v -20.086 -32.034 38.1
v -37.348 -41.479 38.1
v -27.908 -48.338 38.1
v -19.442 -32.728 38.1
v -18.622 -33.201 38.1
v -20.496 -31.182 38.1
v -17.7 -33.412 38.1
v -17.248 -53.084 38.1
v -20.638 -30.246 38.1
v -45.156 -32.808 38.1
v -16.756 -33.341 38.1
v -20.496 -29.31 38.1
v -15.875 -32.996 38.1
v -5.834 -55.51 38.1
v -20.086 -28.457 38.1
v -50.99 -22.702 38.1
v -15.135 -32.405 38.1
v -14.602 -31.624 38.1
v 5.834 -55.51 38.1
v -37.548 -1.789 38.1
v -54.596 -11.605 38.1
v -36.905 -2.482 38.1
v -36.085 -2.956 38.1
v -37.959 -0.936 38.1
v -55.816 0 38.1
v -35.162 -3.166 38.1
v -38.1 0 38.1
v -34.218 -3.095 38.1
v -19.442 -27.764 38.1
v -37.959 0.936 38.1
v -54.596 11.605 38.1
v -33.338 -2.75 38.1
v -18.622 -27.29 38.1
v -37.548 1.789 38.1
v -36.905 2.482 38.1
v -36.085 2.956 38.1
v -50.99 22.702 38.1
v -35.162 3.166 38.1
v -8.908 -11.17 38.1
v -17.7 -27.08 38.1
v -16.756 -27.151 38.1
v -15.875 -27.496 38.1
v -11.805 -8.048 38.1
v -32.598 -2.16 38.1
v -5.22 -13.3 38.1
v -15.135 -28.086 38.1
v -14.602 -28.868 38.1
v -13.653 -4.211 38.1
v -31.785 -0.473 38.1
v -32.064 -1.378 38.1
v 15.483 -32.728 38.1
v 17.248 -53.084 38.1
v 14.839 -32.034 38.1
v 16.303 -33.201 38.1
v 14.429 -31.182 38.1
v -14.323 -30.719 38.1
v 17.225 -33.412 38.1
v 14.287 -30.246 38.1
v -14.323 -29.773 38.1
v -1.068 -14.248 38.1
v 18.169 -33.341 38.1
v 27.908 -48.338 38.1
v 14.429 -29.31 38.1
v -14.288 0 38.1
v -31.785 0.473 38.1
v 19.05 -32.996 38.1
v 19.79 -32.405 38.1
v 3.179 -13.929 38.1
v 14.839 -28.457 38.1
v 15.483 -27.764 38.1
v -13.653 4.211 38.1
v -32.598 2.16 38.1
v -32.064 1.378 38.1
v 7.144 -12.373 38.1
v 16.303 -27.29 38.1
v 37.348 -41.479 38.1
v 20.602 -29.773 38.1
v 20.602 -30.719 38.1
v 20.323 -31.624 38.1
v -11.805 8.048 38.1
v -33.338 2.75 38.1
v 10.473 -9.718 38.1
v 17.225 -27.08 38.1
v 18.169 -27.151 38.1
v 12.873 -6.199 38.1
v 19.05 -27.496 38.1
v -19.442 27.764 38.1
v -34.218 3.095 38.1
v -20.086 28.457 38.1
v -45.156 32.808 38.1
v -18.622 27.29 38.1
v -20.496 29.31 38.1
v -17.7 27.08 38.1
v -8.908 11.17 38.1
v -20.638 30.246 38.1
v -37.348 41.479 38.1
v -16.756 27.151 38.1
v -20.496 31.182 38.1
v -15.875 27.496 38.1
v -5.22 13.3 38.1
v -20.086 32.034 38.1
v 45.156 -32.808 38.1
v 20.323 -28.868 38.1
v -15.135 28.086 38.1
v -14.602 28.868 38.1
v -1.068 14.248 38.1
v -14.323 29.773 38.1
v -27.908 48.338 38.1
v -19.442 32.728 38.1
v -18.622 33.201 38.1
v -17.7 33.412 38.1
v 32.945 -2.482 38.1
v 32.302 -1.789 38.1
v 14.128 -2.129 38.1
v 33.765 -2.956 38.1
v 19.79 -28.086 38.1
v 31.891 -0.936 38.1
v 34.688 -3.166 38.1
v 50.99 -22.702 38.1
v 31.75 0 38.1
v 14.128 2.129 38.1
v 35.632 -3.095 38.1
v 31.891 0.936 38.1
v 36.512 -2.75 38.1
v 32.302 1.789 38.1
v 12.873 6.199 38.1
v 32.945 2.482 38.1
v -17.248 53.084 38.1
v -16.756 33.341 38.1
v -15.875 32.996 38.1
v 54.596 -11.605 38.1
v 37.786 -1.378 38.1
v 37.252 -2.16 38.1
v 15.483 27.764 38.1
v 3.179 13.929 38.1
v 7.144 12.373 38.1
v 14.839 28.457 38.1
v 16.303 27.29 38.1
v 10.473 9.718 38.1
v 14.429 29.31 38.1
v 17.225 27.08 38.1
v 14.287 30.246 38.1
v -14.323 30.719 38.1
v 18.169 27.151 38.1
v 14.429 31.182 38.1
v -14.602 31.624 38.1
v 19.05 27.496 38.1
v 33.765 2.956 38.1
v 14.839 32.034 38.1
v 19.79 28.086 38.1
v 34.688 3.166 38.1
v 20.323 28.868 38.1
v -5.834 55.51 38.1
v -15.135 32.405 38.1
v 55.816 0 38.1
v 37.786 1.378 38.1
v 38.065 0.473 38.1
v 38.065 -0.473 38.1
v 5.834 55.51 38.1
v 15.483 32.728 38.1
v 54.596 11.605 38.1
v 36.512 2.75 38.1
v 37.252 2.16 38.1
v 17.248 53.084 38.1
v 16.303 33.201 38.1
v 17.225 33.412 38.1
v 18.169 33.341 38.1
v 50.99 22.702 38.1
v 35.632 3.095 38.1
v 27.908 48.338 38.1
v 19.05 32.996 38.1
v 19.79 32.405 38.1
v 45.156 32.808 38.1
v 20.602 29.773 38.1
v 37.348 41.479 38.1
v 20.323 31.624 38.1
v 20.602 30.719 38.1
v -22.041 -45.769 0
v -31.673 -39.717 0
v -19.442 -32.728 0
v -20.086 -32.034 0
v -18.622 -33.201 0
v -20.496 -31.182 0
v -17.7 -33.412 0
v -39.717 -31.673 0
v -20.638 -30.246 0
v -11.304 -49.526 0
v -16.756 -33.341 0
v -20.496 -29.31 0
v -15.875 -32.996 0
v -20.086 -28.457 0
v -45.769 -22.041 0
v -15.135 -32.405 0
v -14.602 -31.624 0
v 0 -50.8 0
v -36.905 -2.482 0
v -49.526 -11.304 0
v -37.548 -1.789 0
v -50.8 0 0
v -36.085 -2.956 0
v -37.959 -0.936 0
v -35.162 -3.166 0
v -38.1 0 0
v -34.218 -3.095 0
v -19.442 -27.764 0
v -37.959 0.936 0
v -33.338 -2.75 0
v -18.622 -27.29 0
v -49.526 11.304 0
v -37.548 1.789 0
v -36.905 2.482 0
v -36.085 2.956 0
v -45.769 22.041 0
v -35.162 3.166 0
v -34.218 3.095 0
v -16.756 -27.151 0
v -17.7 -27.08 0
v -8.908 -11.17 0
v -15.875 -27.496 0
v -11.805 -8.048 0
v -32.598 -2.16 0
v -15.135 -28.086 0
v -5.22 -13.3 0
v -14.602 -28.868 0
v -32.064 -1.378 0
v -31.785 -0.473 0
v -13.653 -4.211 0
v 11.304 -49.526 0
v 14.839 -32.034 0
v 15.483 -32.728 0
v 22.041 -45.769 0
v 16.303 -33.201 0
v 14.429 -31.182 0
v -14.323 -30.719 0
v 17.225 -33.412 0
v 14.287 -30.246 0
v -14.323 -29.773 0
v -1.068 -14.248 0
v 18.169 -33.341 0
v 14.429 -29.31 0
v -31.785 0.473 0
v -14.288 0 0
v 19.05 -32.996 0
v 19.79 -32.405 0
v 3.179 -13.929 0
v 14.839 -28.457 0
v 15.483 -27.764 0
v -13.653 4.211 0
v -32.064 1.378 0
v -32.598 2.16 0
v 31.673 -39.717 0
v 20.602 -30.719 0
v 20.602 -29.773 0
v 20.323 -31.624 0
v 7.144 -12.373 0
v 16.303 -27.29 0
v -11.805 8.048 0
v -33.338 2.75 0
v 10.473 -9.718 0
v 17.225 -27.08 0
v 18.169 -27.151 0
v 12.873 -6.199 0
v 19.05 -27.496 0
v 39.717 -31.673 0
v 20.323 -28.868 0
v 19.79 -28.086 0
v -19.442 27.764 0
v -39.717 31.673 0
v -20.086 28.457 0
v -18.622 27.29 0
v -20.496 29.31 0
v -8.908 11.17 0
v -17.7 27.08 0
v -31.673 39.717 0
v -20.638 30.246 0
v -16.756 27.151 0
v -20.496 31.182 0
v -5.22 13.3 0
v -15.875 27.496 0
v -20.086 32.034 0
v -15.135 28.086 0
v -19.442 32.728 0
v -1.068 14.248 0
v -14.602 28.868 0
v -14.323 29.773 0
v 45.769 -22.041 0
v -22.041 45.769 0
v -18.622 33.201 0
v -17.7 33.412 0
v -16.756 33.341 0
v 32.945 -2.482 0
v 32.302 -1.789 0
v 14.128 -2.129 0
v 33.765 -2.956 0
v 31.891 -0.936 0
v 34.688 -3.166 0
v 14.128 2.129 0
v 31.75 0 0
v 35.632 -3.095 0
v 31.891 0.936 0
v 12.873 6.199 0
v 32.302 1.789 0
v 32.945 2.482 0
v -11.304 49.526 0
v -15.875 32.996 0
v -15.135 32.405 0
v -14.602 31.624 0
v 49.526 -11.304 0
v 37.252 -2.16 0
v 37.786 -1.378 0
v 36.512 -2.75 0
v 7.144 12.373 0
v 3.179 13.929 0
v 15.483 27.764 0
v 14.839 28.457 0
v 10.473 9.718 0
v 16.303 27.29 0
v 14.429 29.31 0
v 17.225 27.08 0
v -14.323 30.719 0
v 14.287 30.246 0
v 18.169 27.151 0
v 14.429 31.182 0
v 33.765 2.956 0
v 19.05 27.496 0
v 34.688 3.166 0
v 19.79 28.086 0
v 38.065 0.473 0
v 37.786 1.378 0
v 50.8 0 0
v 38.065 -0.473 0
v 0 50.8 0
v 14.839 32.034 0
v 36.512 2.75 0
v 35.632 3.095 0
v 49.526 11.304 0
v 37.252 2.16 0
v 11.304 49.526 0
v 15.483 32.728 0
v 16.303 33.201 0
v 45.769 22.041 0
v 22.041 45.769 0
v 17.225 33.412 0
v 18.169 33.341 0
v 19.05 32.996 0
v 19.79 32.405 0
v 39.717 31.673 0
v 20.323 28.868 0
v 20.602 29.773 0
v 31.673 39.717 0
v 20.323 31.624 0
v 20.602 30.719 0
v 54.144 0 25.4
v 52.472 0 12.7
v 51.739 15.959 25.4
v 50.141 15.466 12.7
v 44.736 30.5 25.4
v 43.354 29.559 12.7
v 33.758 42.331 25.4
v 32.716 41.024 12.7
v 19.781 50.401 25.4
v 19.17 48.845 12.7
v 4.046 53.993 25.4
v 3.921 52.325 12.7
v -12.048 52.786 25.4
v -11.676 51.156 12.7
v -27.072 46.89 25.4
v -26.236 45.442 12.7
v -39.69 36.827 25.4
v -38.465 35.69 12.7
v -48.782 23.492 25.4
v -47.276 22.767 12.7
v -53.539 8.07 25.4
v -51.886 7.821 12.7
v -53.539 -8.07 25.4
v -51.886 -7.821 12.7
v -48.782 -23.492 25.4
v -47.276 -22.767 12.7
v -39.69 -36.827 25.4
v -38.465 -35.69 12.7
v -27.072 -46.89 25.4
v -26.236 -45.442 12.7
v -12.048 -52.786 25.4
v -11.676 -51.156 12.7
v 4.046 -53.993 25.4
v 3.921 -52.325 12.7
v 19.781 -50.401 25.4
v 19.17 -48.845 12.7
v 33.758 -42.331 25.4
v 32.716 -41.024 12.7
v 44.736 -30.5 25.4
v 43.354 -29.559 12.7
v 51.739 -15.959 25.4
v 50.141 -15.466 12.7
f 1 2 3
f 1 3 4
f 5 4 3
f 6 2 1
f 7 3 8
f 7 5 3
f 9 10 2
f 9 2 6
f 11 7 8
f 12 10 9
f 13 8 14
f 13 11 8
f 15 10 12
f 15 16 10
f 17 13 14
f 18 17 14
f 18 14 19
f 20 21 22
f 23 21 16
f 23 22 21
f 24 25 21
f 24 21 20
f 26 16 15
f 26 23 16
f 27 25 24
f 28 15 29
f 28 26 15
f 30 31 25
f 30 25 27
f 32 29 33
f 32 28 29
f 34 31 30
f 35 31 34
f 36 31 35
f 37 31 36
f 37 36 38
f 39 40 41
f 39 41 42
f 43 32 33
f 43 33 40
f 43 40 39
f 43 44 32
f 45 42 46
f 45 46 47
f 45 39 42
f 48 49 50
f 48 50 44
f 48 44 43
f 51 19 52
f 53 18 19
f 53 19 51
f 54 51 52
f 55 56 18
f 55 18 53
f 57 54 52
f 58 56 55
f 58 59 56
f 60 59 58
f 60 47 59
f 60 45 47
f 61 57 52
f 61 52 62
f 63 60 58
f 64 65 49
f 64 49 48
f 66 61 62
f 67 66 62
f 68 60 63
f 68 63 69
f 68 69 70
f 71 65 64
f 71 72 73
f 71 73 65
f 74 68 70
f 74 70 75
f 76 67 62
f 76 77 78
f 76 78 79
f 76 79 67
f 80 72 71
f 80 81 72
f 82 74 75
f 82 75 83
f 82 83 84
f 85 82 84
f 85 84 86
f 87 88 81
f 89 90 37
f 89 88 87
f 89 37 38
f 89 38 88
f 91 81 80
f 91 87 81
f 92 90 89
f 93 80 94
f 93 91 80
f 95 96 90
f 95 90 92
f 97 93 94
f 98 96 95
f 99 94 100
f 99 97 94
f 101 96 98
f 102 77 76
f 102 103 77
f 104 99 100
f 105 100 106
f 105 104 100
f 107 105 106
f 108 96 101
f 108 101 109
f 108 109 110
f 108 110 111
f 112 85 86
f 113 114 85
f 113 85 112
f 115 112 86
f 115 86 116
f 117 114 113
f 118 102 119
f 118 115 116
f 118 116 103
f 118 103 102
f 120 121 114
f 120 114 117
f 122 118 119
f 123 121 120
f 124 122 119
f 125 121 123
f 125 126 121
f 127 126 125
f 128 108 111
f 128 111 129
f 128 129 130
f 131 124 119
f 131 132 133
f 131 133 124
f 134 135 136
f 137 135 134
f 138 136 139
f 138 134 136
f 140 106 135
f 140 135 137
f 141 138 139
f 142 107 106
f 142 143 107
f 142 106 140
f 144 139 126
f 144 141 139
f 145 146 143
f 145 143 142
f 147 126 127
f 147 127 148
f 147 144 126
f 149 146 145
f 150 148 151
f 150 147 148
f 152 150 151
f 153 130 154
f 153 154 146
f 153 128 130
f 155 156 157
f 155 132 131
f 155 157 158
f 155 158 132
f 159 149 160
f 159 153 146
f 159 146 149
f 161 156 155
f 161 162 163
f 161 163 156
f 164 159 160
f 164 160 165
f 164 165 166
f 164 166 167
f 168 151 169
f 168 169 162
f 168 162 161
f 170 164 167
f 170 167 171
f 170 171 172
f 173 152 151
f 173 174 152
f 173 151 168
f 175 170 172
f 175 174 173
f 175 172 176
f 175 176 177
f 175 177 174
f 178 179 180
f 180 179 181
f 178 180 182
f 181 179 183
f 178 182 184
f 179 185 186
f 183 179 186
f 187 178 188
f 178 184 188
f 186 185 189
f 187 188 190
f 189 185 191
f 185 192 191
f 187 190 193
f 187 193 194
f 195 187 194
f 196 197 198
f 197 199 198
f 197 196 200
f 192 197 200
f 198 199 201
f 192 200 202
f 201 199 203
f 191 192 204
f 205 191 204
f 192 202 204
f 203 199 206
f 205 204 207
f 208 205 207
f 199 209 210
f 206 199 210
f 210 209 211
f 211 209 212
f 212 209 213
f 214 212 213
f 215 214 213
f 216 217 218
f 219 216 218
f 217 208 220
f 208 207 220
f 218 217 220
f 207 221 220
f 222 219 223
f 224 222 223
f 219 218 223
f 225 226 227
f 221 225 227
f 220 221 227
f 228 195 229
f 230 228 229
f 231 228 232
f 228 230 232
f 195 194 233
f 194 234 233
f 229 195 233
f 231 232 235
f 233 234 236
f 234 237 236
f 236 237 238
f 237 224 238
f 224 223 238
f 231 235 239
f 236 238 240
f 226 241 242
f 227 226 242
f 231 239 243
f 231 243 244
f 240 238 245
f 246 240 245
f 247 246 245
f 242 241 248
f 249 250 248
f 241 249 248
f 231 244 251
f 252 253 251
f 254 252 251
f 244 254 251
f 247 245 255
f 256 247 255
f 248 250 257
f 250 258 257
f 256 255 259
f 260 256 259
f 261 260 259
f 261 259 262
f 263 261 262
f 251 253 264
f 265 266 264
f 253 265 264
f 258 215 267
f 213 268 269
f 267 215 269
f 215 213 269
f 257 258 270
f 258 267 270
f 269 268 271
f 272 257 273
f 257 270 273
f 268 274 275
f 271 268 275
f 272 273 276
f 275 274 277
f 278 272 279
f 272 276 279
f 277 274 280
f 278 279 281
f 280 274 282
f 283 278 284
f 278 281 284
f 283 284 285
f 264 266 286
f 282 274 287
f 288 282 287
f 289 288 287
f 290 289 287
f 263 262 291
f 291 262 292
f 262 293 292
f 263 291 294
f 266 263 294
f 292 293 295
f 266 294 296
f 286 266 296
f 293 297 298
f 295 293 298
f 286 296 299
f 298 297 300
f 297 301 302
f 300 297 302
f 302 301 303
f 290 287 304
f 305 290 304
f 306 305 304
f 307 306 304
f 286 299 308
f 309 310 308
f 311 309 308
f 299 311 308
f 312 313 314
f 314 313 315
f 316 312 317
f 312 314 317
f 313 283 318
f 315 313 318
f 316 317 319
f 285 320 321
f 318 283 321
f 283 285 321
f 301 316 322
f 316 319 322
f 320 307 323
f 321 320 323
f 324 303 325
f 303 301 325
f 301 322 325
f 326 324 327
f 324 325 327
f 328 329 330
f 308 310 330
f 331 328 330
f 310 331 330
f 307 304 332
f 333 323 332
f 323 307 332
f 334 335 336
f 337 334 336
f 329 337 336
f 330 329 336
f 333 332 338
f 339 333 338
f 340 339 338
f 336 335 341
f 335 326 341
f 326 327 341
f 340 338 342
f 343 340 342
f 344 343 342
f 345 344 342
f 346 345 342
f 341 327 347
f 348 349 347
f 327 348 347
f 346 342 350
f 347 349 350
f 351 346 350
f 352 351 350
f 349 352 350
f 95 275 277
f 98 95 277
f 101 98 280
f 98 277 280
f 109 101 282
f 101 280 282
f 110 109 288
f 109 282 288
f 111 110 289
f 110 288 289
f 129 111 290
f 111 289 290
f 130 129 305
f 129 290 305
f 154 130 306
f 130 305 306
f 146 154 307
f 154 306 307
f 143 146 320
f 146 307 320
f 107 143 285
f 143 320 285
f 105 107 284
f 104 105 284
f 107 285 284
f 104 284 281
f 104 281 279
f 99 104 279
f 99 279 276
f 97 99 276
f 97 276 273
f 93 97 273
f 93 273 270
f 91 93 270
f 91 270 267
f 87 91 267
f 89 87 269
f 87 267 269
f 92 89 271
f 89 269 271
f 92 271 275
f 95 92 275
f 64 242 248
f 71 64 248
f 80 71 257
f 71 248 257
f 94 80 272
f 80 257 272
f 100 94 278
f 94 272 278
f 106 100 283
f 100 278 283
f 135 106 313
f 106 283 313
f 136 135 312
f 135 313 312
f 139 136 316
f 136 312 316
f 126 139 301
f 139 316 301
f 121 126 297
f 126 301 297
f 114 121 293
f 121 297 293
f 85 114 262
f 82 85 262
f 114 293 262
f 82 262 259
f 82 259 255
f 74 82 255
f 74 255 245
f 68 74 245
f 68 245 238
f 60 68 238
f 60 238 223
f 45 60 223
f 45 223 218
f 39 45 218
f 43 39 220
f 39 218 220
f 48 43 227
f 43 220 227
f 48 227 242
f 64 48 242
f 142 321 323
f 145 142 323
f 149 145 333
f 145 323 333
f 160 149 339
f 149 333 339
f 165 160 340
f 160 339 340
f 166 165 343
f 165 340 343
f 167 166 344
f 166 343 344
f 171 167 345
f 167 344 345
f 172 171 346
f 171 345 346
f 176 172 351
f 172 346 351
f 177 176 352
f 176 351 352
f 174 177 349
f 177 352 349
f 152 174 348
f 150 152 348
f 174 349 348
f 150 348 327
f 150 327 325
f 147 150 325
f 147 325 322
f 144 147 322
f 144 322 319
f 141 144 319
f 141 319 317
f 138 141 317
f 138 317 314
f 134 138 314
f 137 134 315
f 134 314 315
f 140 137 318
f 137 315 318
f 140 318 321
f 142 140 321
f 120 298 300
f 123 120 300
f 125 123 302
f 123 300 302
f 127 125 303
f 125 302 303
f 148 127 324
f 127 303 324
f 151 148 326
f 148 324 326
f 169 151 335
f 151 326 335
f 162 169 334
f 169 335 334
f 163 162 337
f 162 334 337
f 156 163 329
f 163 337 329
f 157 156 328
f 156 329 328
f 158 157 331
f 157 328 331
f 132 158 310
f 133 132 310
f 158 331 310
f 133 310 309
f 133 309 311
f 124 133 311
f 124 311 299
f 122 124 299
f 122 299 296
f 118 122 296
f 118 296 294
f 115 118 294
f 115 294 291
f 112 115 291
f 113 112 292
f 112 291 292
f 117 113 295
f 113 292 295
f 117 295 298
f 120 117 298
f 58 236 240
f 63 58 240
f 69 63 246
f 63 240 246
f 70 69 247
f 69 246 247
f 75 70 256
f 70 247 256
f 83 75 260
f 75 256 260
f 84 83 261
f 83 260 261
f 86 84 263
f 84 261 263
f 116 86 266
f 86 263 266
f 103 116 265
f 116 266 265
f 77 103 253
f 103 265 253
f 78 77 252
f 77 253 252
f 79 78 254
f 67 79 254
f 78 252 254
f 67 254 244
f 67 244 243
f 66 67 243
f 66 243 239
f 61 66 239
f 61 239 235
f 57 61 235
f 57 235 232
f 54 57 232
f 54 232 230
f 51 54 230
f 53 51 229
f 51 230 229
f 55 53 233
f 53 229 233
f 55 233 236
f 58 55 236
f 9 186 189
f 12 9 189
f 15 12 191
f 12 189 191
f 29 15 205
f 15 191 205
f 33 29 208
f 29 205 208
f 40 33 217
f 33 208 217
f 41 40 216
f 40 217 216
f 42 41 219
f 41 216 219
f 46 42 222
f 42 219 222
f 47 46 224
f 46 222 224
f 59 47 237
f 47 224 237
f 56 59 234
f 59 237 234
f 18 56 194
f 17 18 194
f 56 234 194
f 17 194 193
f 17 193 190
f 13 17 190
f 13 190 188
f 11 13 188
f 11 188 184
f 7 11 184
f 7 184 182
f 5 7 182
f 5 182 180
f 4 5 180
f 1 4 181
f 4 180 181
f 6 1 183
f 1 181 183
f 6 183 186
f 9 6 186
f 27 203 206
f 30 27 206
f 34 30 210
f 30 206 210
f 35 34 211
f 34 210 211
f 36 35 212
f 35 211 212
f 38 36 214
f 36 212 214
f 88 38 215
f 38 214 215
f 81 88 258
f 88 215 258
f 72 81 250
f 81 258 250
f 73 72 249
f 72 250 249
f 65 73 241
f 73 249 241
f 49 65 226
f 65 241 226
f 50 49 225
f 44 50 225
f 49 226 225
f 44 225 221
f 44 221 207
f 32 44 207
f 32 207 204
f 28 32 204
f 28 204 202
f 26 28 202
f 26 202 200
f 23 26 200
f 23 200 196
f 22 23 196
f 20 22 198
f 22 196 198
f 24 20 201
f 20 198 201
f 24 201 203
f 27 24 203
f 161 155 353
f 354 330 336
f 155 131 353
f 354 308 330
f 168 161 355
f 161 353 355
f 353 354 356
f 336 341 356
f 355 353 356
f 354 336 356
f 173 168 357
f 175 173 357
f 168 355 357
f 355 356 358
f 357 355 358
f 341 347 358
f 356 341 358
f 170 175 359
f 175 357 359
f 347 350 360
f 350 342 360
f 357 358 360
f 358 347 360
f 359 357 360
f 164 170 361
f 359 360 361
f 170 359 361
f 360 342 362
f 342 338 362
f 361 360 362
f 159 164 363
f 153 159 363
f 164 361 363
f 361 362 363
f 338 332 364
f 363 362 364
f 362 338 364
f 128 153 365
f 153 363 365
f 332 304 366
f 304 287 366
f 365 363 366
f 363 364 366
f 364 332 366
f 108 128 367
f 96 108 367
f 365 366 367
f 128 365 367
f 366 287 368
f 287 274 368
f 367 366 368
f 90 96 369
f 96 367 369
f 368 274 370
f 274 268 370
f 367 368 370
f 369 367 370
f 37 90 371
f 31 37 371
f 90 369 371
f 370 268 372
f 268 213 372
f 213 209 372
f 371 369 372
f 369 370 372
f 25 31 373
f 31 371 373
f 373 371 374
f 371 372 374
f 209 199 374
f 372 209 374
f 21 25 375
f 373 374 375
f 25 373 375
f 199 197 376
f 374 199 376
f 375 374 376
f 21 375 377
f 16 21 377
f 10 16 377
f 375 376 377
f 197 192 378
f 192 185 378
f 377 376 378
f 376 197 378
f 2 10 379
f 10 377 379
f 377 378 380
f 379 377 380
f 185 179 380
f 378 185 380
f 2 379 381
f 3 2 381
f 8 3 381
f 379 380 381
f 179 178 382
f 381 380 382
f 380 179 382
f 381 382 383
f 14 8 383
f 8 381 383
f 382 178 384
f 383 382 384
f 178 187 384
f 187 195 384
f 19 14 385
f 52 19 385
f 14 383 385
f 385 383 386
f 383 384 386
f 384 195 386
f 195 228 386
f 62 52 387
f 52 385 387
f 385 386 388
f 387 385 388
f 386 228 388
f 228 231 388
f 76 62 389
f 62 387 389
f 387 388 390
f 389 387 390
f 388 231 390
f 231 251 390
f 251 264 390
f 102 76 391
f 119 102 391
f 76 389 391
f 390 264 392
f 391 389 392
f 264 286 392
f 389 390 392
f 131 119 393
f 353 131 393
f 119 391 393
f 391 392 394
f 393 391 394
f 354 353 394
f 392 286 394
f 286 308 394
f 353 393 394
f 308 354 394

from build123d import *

# Parameters (mm, degrees)
SKETCH1_R           = 50.8
BOSS_EXTRUDE1_DEPTH = 38.1
BOSS_EXTRUDE1_DRAFT = -7.5
SKETCH2_R           = 14.2875
CUT_EXTRUDE1_DEPTH  = 38.1
SKETCH3_R           = 3.175
CUT_EXTRUDE2_DEPTH  = 38.1


with BuildPart() as part:
    # Sketch1 → Boss-Extrude1 (with draft: the straight prism first)
    with BuildSketch(Plane.XY):
        Circle(SKETCH1_R)
    extrude(amount=BOSS_EXTRUDE1_DEPTH)
    # Boss-Extrude1: the draft: its side faces are tilted about the plane it starts from
    boss_extrude1_sides = [part.faces().sort_by_distance(p)[0] for p in [
        (-50.8, 0, 19.05),
    ]]
    draft(boss_extrude1_sides, Plane.XY, BOSS_EXTRUDE1_DRAFT)

    # Sketch2 → Cut-Extrude1 (cut)
    with BuildSketch(Plane(origin=(0, 0, 0), x_dir=(-1, 0, 0), z_dir=(0, 0, -1))):
        Circle(SKETCH2_R)
    extrude(amount=-CUT_EXTRUDE1_DEPTH, mode=Mode.SUBTRACT)

    # Sketch3 → Cut-Extrude2 (cut)
    with BuildSketch(Plane(origin=(0, 0, 0), x_dir=(-1, 0, 0), z_dir=(0, 0, -1))):
        with Locations((34.925, 0)):
            Circle(SKETCH3_R)
        with Locations((17.4625, -30.245937227)):
            Circle(SKETCH3_R)
        with Locations((-17.4625, -30.245937227)):
            Circle(SKETCH3_R)
        with Locations((-34.925, 0)):
            Circle(SKETCH3_R)
        with Locations((-17.4625, 30.245937227)):
            Circle(SKETCH3_R)
        with Locations((17.4625, 30.245937227)):
            Circle(SKETCH3_R)
    extrude(amount=-CUT_EXTRUDE2_DEPTH, mode=Mode.SUBTRACT)


solid = part.part
